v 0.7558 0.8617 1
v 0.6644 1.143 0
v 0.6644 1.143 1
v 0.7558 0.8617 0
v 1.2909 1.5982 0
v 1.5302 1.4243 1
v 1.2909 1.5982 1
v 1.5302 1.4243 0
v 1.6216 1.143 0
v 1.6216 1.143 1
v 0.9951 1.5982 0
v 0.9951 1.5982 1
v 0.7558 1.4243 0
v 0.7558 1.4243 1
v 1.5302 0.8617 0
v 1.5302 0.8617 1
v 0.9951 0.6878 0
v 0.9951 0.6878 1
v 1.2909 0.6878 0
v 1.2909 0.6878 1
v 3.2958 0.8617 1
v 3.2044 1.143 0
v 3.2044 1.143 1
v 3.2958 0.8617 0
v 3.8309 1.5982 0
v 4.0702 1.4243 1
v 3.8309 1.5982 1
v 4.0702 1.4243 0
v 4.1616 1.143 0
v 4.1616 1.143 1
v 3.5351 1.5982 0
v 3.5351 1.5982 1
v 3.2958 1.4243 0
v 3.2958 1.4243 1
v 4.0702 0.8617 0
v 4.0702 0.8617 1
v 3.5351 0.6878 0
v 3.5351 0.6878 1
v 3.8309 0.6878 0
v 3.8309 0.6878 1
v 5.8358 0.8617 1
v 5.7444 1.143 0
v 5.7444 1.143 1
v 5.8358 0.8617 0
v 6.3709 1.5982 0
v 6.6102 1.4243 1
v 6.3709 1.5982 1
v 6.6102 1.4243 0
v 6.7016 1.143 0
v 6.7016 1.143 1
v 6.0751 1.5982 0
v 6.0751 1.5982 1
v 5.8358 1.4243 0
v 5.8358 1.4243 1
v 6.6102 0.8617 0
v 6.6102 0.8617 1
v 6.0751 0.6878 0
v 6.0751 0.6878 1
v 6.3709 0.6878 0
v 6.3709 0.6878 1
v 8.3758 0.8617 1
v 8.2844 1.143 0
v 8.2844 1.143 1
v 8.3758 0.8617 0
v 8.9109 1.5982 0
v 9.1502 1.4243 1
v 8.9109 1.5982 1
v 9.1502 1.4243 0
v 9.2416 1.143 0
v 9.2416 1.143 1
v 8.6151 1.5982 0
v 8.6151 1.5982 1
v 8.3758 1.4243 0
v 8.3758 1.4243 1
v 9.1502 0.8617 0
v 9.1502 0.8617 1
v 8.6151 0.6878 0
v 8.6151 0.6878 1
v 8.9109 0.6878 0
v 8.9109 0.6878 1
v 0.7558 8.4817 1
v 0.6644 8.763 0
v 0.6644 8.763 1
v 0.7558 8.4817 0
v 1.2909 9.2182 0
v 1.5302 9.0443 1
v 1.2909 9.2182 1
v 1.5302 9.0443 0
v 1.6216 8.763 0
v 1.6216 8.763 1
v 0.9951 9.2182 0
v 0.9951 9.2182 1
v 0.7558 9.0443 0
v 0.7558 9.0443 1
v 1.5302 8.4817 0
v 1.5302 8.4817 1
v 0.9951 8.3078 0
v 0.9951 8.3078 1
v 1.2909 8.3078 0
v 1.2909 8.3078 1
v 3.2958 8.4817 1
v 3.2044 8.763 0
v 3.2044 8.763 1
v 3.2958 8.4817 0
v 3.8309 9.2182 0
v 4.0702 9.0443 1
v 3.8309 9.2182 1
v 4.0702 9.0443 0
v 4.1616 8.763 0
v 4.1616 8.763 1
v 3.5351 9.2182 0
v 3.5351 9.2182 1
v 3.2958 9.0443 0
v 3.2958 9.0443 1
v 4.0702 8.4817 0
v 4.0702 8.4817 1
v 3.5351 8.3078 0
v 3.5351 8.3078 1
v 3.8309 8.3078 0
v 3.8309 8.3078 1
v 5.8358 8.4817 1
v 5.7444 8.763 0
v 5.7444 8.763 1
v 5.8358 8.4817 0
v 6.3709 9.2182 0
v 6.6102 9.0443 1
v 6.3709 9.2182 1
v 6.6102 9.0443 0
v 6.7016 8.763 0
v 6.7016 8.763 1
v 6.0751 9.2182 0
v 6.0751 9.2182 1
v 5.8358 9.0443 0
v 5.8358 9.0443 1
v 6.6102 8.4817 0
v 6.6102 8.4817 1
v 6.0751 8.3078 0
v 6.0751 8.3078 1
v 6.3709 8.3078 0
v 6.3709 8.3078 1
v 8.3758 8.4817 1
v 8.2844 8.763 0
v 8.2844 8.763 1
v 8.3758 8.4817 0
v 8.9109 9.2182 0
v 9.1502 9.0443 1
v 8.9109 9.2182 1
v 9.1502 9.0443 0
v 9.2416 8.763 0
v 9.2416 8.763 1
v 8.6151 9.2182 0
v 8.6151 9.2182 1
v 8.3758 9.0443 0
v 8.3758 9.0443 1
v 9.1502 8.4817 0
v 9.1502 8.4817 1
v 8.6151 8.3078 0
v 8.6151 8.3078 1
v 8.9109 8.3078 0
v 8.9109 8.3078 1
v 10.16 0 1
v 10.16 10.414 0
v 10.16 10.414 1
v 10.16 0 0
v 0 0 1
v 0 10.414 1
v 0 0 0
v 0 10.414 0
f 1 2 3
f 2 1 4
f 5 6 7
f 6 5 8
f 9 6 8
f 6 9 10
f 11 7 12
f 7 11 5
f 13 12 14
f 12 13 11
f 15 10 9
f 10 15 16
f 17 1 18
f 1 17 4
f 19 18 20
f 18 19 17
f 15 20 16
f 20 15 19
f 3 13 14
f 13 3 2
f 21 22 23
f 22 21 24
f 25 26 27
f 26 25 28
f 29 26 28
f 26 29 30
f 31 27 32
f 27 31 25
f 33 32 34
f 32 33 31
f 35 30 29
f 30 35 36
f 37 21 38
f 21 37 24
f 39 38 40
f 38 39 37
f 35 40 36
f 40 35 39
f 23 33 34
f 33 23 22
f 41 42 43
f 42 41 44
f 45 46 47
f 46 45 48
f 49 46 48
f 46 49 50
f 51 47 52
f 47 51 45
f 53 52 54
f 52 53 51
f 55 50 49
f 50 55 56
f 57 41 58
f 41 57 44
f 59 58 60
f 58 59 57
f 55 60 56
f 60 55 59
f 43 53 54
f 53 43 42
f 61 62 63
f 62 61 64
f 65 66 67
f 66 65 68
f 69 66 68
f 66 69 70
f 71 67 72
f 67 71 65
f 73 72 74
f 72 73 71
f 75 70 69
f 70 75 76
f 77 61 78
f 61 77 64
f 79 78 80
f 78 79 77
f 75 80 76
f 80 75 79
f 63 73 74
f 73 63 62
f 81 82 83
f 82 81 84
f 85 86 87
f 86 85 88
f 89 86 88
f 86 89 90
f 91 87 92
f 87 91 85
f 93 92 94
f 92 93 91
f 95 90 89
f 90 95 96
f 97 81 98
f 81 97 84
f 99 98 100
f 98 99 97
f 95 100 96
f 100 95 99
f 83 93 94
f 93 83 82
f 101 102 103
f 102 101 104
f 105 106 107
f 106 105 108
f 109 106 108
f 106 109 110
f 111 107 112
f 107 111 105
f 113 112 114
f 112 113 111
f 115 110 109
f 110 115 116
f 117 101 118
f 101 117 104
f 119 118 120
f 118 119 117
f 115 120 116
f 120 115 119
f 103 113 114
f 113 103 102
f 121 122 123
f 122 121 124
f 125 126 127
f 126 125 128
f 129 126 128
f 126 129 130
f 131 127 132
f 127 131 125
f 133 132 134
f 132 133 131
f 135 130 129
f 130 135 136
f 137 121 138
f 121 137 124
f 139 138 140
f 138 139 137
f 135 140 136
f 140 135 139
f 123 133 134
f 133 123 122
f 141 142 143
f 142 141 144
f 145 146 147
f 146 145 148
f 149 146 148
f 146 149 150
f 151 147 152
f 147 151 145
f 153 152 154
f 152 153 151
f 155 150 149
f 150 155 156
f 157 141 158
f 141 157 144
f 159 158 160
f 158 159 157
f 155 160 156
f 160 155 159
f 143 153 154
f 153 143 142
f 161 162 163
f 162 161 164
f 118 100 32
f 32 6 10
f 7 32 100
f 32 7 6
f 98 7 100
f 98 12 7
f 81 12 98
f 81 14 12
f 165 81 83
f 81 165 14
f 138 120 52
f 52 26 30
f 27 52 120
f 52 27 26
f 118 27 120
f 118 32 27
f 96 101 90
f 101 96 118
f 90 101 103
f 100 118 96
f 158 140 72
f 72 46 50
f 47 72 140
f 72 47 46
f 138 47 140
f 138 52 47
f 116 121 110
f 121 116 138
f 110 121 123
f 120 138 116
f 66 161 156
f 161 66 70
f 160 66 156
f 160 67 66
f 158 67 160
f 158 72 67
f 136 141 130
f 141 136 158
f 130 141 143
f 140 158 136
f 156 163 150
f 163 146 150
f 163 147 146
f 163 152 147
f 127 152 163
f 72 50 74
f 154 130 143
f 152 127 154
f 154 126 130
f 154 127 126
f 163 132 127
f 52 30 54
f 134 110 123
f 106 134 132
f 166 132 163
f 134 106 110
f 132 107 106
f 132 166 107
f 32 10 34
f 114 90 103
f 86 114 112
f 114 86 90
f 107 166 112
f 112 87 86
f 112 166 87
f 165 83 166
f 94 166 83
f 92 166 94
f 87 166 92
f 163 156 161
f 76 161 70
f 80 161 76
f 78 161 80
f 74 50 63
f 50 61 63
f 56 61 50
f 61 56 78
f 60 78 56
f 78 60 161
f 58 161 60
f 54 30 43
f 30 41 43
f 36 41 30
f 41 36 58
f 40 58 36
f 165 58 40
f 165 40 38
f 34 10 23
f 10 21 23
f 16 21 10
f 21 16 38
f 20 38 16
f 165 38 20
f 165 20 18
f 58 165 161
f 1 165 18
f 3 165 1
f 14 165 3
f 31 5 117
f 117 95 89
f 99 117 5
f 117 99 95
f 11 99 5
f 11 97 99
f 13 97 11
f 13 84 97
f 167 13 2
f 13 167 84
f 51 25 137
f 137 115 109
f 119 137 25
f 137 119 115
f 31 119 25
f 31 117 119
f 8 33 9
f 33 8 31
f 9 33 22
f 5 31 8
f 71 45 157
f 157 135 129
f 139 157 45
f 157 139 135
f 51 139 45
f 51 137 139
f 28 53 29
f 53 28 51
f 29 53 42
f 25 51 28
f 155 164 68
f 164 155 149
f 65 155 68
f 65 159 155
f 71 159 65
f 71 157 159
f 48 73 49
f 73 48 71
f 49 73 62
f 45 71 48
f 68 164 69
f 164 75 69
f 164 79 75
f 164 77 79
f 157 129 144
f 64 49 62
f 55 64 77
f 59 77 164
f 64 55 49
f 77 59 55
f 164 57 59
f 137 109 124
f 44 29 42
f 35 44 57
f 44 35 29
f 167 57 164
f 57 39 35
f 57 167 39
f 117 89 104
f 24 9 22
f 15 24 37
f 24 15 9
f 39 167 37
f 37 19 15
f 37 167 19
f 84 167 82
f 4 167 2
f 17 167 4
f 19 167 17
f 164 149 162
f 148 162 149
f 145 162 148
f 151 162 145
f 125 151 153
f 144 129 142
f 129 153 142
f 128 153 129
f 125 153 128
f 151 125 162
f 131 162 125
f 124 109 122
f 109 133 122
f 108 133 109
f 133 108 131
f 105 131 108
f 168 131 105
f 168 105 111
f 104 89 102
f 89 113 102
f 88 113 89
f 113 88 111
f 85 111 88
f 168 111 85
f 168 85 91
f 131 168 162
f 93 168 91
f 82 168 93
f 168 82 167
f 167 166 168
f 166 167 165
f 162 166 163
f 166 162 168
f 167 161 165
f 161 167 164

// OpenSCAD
// Breadboard experiment
// Adrian McCarthy 2022

// Can we print a piece that will fit in a solderless breadboard
// or piece of protoboard?  My guess is that the pins will be too
// thin and fragile.

// Conclusion:  Nope.  Even after tweaking slicer parameters, the
// pins were too thick and too fragile.

// Can we print a plate with holes that can be "staked" to a
// breadboard with generic headers?

// Conclusion:  Nope.  The holes are too small to print reliably.

// Dimensions based off of the dimensions of a DIP package that
// was in inches.

function thou(x) = x*25.4/1000;

pin_spacing  = thou(100);
pin_diameter = thou( 18);
pin_height   = thou(140);
base_width   = thou(400);
base_depth   = thou(410);
base_height  = 1;
x_offset     = thou( 45);
y_offset     = x_offset;

difference() {
    cube([base_width, base_depth, base_height]);
    for (y = [y_offset:3*pin_spacing:base_depth]) {
        for (x = [x_offset:pin_spacing:base_width]) {
            translate([x, y, -1])
              cylinder(h=base_height+2, d=pin_diameter + 0.5, $fn=10);
        }
    }
}
